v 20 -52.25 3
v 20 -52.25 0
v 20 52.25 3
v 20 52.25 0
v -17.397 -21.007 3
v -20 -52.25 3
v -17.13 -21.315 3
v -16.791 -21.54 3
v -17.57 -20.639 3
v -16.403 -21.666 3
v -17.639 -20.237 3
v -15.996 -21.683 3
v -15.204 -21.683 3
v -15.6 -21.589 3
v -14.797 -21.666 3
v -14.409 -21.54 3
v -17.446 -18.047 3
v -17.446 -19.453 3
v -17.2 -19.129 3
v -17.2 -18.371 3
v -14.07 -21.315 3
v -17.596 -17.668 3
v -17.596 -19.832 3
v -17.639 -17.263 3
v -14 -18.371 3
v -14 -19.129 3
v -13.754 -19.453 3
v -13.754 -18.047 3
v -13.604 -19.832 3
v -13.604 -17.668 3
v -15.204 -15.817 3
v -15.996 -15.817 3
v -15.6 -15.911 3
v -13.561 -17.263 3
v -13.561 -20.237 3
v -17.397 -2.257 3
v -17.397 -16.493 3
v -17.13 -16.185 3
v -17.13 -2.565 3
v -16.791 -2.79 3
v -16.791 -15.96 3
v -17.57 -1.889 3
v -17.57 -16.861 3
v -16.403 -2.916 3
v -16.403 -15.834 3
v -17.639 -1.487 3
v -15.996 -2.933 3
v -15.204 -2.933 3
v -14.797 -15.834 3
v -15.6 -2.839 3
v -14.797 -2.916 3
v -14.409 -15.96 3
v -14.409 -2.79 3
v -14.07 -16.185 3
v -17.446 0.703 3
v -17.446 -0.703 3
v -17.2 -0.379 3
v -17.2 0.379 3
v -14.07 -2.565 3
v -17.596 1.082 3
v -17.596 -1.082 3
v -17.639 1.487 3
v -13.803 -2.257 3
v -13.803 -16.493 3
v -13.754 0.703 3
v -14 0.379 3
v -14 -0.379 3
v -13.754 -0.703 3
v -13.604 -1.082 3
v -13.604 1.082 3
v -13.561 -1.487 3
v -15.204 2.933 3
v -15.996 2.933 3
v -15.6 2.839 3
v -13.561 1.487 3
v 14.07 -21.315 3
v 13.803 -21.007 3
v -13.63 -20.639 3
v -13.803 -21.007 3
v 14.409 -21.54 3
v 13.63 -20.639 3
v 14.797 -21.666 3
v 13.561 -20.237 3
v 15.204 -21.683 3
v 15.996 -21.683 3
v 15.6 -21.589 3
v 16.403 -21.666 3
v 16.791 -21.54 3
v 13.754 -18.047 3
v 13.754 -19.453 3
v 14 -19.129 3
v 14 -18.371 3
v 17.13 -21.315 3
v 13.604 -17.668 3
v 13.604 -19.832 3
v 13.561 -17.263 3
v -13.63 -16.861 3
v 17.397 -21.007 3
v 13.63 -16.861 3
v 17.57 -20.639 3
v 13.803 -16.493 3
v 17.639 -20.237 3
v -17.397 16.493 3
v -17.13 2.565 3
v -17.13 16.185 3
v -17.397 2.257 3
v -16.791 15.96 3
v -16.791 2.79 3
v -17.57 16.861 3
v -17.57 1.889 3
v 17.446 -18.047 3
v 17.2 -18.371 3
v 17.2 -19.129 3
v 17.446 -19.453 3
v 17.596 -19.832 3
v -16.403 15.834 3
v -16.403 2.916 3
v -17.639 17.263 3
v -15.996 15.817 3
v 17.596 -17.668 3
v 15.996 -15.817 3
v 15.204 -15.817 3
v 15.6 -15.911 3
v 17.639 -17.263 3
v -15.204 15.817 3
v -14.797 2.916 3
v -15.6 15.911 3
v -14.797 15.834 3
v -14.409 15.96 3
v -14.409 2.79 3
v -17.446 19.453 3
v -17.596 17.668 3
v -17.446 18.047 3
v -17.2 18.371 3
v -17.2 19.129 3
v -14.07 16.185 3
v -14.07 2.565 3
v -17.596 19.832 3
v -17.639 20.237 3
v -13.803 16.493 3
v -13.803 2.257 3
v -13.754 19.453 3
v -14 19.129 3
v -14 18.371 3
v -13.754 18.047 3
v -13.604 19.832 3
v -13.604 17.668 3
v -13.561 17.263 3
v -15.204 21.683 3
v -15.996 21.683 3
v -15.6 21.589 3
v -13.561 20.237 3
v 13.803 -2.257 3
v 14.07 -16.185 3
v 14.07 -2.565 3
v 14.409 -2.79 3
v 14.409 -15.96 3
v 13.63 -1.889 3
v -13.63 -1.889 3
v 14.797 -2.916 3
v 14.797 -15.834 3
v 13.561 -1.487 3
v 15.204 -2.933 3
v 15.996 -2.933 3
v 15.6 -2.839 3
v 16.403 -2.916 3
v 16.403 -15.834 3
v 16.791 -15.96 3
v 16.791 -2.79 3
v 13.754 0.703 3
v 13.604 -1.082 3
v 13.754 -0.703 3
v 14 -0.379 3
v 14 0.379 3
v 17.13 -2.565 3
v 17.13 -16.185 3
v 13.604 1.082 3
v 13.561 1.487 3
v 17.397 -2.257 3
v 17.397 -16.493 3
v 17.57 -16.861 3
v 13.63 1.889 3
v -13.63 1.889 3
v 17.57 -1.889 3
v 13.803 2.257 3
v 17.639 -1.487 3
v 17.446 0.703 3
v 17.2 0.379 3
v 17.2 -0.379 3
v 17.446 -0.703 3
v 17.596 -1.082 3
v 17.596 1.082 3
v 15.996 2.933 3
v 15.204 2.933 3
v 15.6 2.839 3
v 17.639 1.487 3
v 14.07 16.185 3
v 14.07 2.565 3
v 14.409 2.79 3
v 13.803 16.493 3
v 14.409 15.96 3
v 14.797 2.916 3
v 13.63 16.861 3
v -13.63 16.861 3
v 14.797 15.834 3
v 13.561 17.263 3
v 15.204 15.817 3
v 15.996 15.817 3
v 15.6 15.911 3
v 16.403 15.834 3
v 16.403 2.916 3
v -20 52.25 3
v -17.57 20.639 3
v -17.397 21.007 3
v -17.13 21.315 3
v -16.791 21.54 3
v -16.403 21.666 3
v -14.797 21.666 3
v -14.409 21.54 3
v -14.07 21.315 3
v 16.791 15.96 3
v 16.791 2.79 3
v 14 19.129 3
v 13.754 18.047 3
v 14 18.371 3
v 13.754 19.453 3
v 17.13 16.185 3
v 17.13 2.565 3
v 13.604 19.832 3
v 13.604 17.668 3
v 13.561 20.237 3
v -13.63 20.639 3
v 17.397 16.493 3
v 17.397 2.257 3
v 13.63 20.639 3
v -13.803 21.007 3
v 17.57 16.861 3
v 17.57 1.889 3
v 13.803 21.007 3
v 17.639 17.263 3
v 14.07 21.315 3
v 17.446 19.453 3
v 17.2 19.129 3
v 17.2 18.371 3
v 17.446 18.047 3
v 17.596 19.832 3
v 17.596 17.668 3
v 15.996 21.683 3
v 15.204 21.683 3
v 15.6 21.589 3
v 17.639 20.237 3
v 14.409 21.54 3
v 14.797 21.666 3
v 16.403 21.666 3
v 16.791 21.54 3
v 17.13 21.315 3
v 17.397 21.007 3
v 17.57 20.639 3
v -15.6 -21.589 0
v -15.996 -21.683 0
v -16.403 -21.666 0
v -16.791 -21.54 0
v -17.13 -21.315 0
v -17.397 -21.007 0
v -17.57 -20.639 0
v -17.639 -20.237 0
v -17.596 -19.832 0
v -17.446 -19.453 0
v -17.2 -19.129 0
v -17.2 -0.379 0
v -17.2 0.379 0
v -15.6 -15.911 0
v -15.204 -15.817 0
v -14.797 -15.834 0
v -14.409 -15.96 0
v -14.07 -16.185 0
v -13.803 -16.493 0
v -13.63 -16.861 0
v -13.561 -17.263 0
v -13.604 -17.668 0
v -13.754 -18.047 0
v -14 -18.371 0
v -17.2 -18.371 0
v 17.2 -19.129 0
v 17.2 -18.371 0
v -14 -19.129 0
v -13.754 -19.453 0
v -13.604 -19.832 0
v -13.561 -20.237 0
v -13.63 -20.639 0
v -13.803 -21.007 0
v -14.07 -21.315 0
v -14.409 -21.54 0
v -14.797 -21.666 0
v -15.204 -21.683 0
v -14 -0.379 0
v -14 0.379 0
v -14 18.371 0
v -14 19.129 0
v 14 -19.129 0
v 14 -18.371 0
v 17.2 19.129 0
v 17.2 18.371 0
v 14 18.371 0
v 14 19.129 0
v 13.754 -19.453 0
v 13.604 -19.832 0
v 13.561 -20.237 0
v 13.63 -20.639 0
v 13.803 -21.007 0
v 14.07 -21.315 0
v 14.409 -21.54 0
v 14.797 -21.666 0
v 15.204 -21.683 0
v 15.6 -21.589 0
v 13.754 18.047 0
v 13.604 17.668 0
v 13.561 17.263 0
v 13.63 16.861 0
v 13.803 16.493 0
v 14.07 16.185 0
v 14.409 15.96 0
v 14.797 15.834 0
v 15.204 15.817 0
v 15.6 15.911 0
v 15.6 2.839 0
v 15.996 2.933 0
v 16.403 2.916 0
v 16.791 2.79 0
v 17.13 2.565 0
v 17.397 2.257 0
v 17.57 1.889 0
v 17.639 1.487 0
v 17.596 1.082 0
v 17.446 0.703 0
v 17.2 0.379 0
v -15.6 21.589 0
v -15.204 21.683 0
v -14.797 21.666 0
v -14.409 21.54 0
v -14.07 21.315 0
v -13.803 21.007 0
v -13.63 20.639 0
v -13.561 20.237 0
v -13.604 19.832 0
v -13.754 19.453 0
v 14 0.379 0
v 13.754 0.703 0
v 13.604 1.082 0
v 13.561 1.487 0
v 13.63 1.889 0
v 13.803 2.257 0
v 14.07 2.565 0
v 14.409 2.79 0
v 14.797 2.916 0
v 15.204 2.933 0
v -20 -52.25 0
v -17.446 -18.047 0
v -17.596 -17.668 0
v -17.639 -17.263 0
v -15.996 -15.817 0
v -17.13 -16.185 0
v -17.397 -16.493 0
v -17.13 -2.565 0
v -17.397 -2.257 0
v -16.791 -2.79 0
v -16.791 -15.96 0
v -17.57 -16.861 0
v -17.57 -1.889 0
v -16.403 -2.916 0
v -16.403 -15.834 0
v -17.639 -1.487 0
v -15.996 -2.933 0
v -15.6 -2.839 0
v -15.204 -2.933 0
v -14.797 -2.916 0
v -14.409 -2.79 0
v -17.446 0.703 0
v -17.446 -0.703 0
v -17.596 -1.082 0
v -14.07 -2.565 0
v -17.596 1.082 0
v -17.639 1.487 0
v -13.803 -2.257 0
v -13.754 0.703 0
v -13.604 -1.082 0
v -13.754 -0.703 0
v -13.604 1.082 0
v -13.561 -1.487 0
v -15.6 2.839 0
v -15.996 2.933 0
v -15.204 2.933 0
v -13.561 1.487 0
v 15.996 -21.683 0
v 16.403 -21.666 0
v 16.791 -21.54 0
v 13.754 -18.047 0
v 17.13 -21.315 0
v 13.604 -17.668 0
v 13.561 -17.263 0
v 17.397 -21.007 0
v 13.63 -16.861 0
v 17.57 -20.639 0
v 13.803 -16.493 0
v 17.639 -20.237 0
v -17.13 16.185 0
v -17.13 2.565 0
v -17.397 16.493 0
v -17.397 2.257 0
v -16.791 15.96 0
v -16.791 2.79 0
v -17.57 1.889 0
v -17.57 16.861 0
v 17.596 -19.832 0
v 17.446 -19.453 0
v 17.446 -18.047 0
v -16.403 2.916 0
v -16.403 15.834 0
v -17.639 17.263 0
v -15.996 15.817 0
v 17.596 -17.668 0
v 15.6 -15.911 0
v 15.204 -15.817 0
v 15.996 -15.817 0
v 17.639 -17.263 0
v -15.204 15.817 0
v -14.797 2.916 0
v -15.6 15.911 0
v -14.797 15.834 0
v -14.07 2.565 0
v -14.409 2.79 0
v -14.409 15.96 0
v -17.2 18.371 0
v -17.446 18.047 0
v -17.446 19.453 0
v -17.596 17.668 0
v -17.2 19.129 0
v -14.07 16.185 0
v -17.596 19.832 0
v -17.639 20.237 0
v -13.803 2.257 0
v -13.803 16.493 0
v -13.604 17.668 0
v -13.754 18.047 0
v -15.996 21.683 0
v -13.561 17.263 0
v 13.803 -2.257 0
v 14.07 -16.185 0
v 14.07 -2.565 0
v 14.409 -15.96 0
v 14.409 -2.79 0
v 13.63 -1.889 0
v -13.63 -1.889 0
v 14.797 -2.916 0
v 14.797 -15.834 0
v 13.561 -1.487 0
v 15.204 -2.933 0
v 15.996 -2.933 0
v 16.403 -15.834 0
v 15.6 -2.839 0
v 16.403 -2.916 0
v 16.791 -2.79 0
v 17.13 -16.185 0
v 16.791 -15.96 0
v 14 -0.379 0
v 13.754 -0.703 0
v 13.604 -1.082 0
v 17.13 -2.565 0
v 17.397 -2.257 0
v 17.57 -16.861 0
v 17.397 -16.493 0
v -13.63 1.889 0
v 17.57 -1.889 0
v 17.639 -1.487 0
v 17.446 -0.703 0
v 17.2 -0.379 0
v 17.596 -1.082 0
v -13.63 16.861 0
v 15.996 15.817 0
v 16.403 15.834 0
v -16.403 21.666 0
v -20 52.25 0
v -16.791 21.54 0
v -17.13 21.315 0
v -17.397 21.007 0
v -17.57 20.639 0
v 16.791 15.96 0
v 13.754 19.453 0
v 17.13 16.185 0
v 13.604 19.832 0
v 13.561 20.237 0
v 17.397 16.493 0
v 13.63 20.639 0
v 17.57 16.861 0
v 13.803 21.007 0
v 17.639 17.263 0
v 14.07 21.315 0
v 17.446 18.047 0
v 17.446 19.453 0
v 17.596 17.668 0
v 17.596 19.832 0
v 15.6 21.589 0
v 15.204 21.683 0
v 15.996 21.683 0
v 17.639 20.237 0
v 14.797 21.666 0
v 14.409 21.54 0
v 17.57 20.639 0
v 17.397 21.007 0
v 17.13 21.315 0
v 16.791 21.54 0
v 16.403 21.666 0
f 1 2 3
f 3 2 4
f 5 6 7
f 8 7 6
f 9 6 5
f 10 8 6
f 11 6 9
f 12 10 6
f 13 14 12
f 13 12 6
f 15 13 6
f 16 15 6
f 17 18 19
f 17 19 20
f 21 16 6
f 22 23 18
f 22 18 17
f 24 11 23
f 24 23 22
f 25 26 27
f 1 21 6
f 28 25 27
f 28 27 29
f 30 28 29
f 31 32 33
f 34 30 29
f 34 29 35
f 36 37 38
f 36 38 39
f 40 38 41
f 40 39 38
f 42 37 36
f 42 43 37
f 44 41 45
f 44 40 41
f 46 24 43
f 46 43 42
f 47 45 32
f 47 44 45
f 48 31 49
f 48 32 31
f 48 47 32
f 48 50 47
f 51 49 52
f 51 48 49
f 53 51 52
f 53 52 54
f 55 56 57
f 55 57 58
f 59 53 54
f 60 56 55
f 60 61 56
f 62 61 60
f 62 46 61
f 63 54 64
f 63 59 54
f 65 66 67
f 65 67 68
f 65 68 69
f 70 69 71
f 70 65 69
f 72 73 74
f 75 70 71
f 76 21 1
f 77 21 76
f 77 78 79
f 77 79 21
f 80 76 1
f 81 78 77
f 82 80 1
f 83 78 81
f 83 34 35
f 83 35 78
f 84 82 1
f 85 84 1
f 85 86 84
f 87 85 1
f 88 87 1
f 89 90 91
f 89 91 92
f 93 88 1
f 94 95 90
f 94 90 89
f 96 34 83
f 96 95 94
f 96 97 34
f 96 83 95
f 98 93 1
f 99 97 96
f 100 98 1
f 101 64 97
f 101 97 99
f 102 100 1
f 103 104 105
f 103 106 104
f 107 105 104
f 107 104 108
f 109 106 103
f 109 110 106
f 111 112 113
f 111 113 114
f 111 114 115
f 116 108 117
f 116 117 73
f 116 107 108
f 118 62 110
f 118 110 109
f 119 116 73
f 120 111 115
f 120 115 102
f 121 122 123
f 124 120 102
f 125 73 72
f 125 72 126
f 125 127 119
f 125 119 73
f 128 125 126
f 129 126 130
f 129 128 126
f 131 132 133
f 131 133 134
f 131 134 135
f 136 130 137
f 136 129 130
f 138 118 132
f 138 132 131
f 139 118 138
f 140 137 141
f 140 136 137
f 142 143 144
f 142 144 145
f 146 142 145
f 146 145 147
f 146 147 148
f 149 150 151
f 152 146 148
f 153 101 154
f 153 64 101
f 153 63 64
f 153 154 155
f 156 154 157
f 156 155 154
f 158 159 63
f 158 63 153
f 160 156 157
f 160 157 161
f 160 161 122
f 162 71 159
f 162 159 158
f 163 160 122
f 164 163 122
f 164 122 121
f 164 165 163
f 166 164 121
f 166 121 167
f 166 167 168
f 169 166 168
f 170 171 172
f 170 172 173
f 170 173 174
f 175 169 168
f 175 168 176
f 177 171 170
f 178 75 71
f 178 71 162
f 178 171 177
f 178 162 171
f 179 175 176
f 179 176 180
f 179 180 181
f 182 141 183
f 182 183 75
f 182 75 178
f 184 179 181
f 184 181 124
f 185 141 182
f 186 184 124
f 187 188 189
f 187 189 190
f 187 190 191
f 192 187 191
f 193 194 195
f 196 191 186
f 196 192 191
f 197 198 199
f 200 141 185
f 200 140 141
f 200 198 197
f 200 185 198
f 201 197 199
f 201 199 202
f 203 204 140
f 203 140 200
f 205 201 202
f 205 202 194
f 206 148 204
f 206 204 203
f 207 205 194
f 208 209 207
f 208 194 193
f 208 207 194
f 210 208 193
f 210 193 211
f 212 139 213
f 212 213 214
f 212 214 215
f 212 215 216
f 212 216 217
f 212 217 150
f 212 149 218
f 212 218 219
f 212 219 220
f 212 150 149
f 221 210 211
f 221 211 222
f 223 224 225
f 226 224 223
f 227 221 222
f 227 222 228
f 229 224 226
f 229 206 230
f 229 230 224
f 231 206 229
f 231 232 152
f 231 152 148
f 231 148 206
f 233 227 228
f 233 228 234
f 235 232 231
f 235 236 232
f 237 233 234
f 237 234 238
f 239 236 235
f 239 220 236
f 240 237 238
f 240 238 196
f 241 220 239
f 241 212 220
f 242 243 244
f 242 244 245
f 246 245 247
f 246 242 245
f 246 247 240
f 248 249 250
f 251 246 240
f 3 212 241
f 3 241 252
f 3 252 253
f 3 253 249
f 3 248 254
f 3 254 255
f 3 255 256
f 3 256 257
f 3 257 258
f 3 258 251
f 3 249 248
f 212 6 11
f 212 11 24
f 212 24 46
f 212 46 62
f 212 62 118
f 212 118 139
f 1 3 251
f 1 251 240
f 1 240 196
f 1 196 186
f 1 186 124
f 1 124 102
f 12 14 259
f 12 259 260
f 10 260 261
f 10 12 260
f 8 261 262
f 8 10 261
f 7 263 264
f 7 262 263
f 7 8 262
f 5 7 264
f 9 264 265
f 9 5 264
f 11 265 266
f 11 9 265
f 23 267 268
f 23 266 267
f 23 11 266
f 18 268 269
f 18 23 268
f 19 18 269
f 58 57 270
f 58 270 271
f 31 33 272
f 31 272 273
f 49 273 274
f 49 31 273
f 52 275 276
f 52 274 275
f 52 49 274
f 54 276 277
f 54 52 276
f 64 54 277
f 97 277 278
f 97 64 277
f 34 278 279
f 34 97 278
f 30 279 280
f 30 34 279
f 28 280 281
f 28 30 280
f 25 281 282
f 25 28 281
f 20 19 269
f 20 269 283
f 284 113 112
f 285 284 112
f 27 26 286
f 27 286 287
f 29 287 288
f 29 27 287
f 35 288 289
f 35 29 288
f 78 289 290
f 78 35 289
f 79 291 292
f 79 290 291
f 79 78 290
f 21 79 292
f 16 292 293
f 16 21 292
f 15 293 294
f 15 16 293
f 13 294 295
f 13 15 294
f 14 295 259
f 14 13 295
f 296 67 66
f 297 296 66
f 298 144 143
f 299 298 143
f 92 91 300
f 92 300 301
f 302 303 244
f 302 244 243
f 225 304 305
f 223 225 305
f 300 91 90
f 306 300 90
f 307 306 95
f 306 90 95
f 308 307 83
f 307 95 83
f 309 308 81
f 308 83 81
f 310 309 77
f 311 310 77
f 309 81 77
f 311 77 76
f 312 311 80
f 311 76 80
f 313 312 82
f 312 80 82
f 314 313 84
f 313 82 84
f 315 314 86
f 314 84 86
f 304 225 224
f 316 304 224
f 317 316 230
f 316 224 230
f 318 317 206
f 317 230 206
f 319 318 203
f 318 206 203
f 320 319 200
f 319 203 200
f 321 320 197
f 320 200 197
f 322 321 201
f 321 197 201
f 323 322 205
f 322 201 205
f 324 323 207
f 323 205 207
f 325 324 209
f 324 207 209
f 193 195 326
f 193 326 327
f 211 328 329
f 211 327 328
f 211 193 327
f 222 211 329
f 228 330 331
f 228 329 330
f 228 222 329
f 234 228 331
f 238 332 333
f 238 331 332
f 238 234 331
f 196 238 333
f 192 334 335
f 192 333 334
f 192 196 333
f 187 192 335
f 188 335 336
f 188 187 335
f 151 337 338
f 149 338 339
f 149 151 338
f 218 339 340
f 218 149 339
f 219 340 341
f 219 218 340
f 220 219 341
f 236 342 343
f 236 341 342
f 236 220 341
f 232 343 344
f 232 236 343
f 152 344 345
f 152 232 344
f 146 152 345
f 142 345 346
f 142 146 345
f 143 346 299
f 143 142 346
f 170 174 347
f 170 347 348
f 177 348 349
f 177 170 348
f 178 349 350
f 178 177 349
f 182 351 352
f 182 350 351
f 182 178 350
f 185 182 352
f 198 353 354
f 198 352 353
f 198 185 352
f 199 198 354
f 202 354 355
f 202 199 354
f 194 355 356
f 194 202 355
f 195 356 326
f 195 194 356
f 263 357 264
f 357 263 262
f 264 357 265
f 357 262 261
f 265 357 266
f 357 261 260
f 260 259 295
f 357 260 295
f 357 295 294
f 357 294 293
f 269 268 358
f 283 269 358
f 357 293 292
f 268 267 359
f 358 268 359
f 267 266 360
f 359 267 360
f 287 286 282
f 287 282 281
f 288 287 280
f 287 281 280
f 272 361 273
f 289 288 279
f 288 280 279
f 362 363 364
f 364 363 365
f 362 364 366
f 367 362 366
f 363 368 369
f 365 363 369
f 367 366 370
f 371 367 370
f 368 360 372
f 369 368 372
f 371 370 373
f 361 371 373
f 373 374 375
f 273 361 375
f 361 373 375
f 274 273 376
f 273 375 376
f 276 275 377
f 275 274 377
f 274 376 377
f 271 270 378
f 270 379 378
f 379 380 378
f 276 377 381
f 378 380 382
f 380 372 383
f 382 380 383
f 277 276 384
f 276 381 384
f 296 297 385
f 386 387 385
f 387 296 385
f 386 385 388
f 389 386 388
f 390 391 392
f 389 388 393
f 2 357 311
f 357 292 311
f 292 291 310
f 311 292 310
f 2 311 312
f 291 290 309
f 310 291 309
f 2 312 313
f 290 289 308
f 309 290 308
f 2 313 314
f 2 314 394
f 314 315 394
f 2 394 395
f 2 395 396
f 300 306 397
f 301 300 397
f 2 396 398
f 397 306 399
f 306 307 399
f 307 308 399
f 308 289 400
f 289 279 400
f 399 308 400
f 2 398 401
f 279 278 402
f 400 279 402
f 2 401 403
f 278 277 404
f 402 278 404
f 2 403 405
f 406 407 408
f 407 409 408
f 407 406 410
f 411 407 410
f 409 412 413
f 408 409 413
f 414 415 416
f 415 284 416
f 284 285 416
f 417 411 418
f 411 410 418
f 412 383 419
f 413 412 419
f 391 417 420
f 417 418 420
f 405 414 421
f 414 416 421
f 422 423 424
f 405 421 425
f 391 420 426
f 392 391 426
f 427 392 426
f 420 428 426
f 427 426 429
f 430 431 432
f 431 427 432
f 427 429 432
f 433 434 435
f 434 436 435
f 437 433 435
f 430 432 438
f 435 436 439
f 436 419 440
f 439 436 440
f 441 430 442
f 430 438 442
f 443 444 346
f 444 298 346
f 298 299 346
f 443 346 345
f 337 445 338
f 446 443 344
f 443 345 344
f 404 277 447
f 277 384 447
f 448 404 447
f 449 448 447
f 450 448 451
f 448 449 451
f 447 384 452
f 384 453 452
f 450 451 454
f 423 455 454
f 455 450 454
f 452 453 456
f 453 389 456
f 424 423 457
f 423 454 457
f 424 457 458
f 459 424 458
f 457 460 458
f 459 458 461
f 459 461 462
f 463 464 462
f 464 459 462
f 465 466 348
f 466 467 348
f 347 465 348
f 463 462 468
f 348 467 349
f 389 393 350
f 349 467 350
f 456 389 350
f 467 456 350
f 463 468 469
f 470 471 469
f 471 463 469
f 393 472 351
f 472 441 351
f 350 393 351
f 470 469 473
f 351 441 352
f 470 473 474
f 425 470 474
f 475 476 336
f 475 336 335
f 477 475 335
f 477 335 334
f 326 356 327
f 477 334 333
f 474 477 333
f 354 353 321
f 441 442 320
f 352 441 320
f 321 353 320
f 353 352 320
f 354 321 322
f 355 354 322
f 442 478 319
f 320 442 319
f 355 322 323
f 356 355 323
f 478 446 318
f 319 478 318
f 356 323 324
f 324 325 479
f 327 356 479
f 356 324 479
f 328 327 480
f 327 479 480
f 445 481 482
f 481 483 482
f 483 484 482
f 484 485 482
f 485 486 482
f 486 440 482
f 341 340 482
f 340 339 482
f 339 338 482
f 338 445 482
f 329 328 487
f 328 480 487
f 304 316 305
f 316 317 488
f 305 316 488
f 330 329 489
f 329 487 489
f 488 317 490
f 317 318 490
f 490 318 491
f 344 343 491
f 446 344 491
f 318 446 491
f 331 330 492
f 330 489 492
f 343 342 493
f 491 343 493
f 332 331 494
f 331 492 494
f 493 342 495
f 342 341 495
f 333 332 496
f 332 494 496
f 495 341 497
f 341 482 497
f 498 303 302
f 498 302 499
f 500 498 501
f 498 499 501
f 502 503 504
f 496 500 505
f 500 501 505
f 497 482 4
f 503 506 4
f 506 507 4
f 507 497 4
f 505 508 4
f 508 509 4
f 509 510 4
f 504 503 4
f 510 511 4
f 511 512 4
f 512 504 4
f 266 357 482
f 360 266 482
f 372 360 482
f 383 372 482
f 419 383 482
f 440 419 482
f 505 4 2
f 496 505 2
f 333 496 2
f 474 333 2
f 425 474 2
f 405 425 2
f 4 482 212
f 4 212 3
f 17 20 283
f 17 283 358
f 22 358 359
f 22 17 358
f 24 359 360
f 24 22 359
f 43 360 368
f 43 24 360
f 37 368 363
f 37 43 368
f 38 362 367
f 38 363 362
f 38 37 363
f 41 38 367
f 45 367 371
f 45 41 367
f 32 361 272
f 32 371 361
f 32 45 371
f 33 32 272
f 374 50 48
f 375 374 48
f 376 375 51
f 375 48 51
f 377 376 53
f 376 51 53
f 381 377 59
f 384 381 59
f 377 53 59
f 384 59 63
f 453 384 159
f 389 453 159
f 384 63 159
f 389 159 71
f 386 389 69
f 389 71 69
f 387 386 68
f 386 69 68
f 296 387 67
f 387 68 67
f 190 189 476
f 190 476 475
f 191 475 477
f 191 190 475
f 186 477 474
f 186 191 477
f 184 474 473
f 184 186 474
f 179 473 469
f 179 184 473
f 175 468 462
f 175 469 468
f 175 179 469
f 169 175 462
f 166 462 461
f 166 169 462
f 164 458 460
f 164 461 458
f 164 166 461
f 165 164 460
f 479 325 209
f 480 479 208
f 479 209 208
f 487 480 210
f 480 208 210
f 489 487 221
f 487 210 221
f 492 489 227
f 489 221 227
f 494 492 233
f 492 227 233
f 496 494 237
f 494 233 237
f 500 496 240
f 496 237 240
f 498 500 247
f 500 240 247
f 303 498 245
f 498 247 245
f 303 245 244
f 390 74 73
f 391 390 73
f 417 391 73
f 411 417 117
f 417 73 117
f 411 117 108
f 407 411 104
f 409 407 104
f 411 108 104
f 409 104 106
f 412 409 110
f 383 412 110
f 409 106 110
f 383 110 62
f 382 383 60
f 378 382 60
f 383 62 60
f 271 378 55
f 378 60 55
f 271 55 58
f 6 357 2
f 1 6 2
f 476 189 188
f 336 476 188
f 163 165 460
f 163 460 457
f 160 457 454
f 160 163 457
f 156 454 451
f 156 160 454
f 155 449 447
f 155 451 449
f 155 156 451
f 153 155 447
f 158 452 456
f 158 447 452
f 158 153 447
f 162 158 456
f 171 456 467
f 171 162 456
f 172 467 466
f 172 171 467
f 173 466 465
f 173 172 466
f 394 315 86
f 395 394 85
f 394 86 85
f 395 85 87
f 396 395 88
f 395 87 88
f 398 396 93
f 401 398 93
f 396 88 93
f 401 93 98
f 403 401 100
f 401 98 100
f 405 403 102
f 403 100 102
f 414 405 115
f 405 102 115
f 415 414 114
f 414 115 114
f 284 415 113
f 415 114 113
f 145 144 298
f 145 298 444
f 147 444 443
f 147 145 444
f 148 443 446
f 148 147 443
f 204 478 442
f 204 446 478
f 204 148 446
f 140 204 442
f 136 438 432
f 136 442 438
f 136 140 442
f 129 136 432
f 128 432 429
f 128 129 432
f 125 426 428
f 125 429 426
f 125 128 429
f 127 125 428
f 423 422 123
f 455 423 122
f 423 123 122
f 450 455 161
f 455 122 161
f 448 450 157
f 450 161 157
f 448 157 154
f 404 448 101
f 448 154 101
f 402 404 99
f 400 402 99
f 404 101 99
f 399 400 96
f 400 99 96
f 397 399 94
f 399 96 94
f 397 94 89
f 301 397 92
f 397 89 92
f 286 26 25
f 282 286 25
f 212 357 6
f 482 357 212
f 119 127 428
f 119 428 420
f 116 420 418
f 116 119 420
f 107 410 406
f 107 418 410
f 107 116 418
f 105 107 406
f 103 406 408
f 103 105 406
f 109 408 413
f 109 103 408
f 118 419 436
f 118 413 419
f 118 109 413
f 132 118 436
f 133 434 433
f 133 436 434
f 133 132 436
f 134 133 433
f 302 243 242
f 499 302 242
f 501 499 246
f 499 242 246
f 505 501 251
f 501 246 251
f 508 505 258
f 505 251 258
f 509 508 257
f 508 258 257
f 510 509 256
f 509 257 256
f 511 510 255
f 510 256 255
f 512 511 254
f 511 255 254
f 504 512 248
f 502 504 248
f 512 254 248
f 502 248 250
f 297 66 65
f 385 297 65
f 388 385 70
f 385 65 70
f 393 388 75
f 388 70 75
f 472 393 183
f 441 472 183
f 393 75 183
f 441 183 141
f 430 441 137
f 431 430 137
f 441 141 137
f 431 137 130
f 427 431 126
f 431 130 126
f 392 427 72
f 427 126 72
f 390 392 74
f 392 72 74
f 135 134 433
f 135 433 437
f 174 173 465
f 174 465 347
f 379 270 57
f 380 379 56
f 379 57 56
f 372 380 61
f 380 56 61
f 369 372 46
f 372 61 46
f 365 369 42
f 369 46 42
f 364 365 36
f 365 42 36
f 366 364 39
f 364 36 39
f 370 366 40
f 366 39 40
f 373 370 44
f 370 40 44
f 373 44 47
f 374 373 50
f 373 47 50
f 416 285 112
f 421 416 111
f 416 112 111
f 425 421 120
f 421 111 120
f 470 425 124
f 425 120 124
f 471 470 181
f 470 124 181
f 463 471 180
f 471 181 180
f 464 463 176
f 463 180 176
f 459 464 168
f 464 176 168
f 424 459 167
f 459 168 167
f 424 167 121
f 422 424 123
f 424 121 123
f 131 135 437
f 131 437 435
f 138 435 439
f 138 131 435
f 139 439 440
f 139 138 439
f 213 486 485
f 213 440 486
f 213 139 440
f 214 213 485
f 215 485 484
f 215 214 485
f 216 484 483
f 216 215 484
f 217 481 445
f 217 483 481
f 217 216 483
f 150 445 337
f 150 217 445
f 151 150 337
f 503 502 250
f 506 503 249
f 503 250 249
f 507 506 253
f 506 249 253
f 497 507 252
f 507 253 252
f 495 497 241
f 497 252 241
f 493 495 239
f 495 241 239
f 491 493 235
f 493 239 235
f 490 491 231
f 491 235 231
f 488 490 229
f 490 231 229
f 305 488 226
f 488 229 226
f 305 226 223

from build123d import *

# Parameters (mm, degrees)
CROQUIS2_W              = 40
CROQUIS2_H              = 104.5
SALIENTE_EXTRUIR1_DEPTH = 3
CROQUIS3_W              = 3.2
CROQUIS3_H              = 5
CORTAR_EXTRUIR1_DEPTH   = 4
CROQUIS4_R              = 1.5
CORTAR_EXTRUIR3_DEPTH   = 3
CORTAR_EXTRUIR4_DEPTH   = 4


with BuildPart() as part:
    # Croquis2 → Saliente-Extruir1 (new body)
    with BuildSketch(Plane.XY):
        Rectangle(CROQUIS2_W, CROQUIS2_H)
    extrude(amount=SALIENTE_EXTRUIR1_DEPTH)

    # Croquis3 → Cortar-Extruir1 (cut, through all)
    with BuildSketch(Plane.XY.offset(3)):
        with Locations((15.6, 18.75)):
            Rectangle(CROQUIS3_W, CROQUIS3_H)
        with Locations((15.6, 0)):
            Rectangle(CROQUIS3_W, CROQUIS3_H)
        with Locations((15.6, -18.75)):
            Rectangle(CROQUIS3_W, CROQUIS3_H)
        with Locations((-15.6, 18.75)):
            Rectangle(CROQUIS3_W, CROQUIS3_H)
        with Locations((-15.6, 0)):
            Rectangle(CROQUIS3_W, CROQUIS3_H)
        with Locations((-15.6, -18.75)):
            Rectangle(CROQUIS3_W, CROQUIS3_H)
    extrude(amount=-CORTAR_EXTRUIR1_DEPTH, mode=Mode.SUBTRACT)

    # Croquis4 → Cortar-Extruir3 (cut)
    with BuildSketch(Plane.XY.offset(3)):
        with Locations((15.060660172, 20.189339828)):
            Circle(CROQUIS4_R)
        with Locations((16.139339828, 20.189339828)):
            Circle(CROQUIS4_R)
        with Locations((16.139339828, 17.310660172)):
            Circle(CROQUIS4_R)
        with Locations((15.060660172, 17.310660172)):
            Circle(CROQUIS4_R)
    extrude(amount=-CORTAR_EXTRUIR3_DEPTH, mode=Mode.SUBTRACT)

    # Croquis5 → Cortar-Extruir4 (cut, through all)
    with BuildSketch(Plane.XY.offset(3)):
        with BuildLine():
            Line((17.2, 0.378679656), (17.2, -0.378679656))
            ThreePointArc((17.2, -0.378679656), (17.396823775, -2.257101482), (15.6, -2.839022846))
            ThreePointArc((15.6, -2.839022846), (13.803176225, -2.257101482), (14, -0.378679656))
            Line((14, -0.378679656), (14, 0.378679656))
            ThreePointArc((14, 0.378679656), (13.803176225, 2.257101482), (15.6, 2.839022846))
            ThreePointArc((15.6, 2.839022846), (17.396823775, 2.257101482), (17.2, 0.378679656))
        make_face()
        with BuildLine():
            Line((14, -18.371320344), (14, -19.128679656))
            ThreePointArc((14, -19.128679656), (13.803176225, -21.007101482), (15.6, -21.589022846))
            ThreePointArc((15.6, -21.589022846), (17.396823775, -21.007101482), (17.2, -19.128679656))
            Line((17.2, -19.128679656), (17.2, -18.371320344))
            ThreePointArc((17.2, -18.371320344), (17.396823775, -16.492898518), (15.6, -15.910977154))
            ThreePointArc((15.6, -15.910977154), (13.803176225, -16.492898518), (14, -18.371320344))
        make_face()
        with BuildLine():
            Line((-17.2, -19.128679656), (-17.2, -18.371320344))
            ThreePointArc((-17.2, -18.371320344), (-17.396823775, -16.492898518), (-15.6, -15.910977154))
            ThreePointArc((-15.6, -15.910977154), (-13.803176225, -16.492898518), (-14, -18.371320344))
            Line((-14, -18.371320344), (-14, -19.128679656))
            ThreePointArc((-14, -19.128679656), (-13.803176225, -21.007101482), (-15.6, -21.589022846))
            ThreePointArc((-15.6, -21.589022846), (-17.396823775, -21.007101482), (-17.2, -19.128679656))
        make_face()
        with BuildLine():
            Line((-14, -0.378679656), (-14, 0.378679656))
            ThreePointArc((-14, 0.378679656), (-13.803176225, 2.257101482), (-15.6, 2.839022846))
            ThreePointArc((-15.6, 2.839022846), (-17.396823775, 2.257101482), (-17.2, 0.378679656))
            Line((-17.2, 0.378679656), (-17.2, -0.378679656))
            ThreePointArc((-17.2, -0.378679656), (-17.396823775, -2.257101482), (-15.6, -2.839022846))
            ThreePointArc((-15.6, -2.839022846), (-13.803176225, -2.257101482), (-14, -0.378679656))
        make_face()
        with BuildLine():
            Line((-17.2, 18.371320344), (-17.2, 19.128679656))
            ThreePointArc((-17.2, 19.128679656), (-17.396823775, 21.007101482), (-15.6, 21.589022846))
            ThreePointArc((-15.6, 21.589022846), (-13.803176225, 21.007101482), (-14, 19.128679656))
            Line((-14, 19.128679656), (-14, 18.371320344))
            ThreePointArc((-14, 18.371320344), (-13.803176225, 16.492898518), (-15.6, 15.910977154))
            ThreePointArc((-15.6, 15.910977154), (-17.396823775, 16.492898518), (-17.2, 18.371320344))
        make_face()
    extrude(amount=-CORTAR_EXTRUIR4_DEPTH, mode=Mode.SUBTRACT)


solid = part.part
